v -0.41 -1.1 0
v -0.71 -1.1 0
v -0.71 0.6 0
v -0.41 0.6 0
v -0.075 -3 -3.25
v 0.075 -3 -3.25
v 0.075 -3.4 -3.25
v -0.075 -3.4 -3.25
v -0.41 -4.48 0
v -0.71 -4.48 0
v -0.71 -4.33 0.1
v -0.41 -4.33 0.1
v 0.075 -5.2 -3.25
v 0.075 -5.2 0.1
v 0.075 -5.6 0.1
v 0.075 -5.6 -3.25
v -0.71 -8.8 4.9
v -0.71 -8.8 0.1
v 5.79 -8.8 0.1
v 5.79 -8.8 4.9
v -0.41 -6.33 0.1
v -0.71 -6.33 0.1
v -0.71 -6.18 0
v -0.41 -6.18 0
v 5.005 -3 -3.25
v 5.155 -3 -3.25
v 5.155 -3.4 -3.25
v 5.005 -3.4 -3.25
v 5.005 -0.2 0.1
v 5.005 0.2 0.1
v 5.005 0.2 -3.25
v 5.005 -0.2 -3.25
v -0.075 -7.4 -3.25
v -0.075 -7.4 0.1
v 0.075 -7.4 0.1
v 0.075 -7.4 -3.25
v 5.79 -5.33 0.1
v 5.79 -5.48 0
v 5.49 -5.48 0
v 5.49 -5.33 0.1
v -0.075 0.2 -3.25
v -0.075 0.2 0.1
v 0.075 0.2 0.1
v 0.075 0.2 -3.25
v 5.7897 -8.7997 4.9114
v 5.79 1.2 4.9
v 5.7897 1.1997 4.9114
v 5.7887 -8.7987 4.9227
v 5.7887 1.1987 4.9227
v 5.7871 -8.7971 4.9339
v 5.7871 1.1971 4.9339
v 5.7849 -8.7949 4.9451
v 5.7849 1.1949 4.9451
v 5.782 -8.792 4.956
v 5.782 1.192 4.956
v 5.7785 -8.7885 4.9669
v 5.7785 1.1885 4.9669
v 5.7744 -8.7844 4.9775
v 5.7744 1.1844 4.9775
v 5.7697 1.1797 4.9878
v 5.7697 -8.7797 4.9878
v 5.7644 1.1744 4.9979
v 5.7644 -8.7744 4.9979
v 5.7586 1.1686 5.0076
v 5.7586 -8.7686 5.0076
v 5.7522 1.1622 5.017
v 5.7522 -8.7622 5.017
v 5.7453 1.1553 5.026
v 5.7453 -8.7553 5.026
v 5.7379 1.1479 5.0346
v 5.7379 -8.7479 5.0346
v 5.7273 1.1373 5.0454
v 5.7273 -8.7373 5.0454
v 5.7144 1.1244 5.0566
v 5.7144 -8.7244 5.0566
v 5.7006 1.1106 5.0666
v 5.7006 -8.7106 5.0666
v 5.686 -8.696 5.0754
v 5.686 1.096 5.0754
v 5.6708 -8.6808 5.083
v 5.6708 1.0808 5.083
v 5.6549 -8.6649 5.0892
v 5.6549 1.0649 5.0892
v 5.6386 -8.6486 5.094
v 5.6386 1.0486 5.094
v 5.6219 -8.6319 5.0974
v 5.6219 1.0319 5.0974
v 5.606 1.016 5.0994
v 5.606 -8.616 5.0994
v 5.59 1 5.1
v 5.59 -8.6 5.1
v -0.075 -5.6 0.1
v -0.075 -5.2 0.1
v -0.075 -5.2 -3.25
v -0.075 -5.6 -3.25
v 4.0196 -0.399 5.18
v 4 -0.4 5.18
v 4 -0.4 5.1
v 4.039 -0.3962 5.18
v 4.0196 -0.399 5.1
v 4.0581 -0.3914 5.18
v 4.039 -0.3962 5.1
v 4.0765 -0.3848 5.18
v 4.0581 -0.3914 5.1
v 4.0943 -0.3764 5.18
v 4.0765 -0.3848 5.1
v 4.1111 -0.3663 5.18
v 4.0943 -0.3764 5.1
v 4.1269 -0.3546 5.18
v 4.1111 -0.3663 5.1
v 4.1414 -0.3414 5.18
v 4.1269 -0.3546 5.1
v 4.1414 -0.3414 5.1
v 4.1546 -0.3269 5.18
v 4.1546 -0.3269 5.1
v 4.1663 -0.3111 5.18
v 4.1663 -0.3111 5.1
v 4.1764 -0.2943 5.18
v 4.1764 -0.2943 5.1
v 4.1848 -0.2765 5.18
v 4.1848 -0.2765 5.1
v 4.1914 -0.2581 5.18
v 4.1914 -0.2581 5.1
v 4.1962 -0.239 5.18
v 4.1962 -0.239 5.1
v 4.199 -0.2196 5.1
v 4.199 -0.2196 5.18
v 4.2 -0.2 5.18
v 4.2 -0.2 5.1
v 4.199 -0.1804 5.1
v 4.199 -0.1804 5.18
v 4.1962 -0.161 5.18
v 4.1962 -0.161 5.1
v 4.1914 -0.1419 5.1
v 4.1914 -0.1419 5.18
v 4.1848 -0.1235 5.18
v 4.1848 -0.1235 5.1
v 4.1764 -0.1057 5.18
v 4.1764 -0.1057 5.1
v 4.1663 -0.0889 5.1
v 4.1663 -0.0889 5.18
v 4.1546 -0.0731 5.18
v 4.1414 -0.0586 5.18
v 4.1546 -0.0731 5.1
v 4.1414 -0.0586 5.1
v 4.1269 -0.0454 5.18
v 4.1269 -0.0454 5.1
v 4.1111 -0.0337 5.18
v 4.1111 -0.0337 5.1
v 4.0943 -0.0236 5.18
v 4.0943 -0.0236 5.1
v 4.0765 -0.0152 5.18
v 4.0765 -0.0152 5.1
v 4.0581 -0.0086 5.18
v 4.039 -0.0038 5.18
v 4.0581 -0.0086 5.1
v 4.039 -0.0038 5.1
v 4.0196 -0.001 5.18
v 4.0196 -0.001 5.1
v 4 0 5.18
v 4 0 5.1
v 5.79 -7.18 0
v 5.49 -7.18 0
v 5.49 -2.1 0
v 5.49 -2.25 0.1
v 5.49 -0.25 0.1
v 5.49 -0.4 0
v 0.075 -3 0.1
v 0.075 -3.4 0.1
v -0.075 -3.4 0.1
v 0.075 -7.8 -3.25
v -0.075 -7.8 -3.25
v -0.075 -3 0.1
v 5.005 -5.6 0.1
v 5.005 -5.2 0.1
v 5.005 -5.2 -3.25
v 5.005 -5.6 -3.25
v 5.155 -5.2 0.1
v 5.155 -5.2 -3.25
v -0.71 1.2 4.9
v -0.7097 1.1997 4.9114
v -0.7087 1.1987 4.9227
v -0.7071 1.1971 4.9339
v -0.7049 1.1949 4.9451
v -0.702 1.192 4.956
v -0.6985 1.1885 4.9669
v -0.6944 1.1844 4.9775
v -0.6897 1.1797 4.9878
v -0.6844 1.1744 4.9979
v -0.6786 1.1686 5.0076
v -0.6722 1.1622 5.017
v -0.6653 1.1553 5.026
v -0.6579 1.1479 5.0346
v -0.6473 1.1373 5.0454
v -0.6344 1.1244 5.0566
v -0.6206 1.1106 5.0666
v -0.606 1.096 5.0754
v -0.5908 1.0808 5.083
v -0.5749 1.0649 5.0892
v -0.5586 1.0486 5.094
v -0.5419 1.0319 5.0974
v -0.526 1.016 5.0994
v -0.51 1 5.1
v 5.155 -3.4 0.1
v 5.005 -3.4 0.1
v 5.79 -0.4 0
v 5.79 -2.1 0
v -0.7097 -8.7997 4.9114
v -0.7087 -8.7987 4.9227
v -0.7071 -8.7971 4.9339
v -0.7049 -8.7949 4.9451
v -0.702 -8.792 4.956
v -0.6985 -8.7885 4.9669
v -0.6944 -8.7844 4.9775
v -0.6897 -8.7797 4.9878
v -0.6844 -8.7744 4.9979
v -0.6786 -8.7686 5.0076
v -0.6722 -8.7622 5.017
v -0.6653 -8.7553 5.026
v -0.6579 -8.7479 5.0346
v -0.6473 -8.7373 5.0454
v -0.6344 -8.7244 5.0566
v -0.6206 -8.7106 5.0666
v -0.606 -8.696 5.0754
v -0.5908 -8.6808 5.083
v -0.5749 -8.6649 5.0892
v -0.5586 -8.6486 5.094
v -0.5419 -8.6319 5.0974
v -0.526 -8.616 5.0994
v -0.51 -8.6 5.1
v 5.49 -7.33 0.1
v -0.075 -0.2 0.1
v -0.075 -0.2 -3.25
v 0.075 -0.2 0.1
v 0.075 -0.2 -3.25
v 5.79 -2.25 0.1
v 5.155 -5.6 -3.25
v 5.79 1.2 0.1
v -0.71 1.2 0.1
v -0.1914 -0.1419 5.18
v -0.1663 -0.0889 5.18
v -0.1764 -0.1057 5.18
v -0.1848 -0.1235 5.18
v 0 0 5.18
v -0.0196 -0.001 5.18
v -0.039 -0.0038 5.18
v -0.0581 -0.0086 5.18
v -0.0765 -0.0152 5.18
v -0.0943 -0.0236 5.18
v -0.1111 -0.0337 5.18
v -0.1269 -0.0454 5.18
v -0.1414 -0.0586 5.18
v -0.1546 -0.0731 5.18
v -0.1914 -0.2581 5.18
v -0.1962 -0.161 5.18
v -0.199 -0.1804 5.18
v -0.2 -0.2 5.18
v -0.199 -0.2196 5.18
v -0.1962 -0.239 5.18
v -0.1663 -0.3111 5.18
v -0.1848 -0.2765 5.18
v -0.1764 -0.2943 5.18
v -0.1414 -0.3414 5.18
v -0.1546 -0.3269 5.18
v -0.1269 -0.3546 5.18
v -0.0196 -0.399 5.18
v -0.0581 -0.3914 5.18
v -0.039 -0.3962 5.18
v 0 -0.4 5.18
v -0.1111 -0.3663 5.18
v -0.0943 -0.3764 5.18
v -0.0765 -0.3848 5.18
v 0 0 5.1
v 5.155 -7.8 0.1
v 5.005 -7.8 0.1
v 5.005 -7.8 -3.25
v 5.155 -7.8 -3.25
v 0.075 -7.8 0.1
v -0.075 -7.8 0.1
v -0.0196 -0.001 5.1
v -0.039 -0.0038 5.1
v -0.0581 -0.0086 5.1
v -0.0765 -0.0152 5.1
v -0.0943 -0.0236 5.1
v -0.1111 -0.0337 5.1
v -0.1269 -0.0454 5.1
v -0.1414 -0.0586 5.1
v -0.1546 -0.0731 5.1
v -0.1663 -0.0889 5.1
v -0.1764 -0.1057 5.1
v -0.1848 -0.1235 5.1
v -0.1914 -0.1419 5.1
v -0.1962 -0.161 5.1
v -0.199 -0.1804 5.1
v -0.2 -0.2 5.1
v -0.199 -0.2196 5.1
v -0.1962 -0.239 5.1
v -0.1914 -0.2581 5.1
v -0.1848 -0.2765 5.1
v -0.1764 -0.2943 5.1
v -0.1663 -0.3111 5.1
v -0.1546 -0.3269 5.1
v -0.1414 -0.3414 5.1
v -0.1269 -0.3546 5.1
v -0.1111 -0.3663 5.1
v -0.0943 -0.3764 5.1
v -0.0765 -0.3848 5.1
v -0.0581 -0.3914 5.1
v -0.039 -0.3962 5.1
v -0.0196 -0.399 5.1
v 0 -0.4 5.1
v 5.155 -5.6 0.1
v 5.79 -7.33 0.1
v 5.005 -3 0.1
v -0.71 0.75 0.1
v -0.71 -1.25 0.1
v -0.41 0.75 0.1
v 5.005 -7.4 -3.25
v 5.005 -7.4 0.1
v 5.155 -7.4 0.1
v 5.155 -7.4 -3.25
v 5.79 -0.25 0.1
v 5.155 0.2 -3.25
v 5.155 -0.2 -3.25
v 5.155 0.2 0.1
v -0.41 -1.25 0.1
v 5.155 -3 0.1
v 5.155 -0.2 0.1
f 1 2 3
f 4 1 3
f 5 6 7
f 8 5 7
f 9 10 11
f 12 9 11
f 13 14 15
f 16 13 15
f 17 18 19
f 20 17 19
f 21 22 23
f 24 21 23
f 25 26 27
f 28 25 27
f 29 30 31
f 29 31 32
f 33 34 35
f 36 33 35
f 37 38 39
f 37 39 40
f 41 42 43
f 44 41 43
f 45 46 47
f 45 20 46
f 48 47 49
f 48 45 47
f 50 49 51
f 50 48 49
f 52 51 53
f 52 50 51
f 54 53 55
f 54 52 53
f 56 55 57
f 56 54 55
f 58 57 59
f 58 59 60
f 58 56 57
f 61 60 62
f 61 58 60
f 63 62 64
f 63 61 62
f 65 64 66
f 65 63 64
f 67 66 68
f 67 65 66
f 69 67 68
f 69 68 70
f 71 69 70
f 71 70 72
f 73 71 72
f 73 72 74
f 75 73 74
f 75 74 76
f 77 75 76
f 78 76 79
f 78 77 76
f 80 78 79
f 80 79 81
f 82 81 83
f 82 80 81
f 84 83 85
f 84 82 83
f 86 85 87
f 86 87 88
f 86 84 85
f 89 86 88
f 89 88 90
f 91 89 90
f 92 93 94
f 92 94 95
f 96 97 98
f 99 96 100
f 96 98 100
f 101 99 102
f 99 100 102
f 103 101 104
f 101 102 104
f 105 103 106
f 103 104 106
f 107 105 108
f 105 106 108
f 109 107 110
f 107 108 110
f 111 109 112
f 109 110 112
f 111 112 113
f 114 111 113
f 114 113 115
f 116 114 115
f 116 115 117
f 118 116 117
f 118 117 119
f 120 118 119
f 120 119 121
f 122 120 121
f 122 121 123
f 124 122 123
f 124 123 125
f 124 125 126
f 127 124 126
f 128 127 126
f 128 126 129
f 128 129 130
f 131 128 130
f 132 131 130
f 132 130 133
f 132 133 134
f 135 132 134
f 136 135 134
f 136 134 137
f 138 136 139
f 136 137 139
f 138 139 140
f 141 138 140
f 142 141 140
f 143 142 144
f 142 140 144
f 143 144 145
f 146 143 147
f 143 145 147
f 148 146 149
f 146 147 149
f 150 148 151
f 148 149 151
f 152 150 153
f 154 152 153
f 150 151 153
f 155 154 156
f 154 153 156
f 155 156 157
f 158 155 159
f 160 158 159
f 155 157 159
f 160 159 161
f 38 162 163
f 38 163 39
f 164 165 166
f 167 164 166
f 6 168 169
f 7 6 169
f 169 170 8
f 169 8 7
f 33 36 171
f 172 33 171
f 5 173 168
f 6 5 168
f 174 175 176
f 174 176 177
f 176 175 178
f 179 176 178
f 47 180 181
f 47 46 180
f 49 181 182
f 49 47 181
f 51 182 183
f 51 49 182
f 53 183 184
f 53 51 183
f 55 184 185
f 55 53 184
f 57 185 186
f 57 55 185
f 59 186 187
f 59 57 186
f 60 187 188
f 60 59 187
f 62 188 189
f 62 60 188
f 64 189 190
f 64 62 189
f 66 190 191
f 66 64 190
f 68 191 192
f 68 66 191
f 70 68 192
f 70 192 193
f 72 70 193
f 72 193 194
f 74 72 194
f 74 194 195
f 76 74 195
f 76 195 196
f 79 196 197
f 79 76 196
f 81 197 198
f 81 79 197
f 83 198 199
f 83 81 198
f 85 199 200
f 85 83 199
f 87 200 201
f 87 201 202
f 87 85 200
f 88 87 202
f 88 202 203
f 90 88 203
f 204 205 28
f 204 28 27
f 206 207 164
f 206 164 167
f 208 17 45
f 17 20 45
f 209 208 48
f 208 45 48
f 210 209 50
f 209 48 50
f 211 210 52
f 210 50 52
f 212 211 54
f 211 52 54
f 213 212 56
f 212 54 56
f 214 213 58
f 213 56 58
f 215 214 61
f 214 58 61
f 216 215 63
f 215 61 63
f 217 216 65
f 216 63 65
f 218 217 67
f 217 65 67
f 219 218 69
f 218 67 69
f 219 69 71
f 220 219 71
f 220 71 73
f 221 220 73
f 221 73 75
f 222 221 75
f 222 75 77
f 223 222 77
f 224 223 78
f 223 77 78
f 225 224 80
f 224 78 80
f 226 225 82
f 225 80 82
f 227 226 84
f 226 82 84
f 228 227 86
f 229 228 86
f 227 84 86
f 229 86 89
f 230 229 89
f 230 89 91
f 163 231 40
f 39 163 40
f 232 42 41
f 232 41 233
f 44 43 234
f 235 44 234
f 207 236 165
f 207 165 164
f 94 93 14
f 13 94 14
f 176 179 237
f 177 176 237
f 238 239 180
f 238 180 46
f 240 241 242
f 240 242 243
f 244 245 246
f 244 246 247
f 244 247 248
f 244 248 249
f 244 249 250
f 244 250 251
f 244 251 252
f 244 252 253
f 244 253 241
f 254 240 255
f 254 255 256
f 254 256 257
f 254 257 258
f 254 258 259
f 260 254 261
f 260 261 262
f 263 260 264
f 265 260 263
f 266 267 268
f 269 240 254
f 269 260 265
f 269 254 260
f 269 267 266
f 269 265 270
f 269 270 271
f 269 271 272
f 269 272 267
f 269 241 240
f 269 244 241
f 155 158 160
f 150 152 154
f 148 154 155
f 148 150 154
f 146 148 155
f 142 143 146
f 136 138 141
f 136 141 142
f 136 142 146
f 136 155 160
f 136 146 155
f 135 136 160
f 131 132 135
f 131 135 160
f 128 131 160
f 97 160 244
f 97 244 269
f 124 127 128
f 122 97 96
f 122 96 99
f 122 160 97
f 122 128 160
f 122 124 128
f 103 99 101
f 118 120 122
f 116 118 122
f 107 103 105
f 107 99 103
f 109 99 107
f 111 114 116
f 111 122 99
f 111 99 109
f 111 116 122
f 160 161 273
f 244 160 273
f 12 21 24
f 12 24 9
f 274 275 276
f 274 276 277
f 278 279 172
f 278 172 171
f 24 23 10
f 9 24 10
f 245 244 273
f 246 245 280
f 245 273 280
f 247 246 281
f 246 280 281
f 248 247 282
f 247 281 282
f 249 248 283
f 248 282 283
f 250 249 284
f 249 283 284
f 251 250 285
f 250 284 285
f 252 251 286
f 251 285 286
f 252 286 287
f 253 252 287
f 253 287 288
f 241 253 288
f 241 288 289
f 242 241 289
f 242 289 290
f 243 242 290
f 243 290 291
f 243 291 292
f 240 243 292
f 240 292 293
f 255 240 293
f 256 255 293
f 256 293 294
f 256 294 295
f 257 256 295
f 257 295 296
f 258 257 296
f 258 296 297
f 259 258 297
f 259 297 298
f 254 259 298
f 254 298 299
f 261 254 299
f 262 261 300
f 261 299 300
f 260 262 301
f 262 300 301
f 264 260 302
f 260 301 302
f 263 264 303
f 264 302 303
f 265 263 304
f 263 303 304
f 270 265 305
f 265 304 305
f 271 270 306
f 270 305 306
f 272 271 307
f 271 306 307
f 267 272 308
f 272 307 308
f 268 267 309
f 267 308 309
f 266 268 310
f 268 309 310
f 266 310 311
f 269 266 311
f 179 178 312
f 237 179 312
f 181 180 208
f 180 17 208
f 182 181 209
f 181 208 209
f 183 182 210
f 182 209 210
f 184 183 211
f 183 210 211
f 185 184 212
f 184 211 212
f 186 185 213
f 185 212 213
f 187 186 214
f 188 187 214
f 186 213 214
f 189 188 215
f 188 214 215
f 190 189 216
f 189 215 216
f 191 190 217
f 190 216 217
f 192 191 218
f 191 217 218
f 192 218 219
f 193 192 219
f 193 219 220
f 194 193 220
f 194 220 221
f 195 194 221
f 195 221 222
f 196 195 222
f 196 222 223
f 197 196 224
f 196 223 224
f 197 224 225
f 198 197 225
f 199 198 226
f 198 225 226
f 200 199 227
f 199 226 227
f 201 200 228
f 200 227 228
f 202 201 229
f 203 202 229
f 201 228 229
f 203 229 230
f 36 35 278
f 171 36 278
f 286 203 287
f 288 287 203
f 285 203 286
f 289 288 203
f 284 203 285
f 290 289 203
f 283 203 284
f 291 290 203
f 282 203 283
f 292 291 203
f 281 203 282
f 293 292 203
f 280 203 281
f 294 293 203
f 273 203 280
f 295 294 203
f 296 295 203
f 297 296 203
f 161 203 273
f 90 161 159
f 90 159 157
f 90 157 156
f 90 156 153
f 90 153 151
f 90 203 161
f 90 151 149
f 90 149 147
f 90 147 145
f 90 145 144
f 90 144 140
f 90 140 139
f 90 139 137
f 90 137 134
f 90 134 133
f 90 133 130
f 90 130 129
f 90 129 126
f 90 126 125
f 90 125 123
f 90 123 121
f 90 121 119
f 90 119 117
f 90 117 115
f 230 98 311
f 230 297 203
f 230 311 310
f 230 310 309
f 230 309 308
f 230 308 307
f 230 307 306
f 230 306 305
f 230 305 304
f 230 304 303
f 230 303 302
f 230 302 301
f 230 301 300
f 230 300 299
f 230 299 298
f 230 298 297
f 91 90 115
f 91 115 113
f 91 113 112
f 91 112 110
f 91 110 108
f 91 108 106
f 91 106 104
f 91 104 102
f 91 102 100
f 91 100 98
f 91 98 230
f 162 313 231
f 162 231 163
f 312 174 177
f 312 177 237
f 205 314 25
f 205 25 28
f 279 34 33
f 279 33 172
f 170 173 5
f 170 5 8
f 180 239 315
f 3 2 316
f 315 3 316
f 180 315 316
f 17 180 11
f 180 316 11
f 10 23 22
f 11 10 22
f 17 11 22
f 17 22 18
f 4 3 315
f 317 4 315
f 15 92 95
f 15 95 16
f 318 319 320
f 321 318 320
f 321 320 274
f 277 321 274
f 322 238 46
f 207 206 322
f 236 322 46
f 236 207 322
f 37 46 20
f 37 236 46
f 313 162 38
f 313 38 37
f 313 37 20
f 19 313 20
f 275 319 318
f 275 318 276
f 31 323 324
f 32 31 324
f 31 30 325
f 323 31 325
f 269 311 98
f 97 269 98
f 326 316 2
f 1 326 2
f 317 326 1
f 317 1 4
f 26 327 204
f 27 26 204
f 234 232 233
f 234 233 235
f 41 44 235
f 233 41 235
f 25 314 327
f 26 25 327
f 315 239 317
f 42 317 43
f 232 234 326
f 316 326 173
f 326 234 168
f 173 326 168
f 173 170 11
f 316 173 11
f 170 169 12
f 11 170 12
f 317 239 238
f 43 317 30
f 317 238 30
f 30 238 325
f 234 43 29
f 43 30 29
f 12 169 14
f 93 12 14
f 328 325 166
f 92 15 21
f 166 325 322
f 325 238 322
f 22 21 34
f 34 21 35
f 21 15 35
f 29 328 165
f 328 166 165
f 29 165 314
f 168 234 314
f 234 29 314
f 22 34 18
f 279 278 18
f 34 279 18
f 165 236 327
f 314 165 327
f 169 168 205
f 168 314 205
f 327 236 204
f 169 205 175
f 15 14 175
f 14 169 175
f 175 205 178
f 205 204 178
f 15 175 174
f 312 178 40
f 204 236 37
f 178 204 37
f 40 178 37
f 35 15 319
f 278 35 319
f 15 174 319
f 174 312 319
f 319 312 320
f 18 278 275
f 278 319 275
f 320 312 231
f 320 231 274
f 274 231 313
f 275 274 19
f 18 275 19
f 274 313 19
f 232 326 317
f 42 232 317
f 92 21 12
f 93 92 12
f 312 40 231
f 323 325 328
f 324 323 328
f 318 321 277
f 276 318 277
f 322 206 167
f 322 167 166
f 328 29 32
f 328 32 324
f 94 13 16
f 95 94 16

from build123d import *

# Parameters (mm, degrees)
PAD003_DEPTH = 0.3
PAD001_DEPTH = 0.18
SKETCH002_W  = 0.4
SKETCH002_H  = 0.15
PAD002_DEPTH = 3.5
SKETCH_W     = 10
SKETCH_H     = 6.5
PAD_DEPTH    = 5
POCKET_DEPTH = 0.5
FILLET_R     = 0.2
PAD004_DEPTH = 0.3


with BuildPart() as pad003:
    # Sketch005 → Pad003 (new body)
    with BuildSketch(Plane(origin=(-0.71, 1, 0), x_dir=(0, 1, 0), z_dir=(1, 0, 0))):
        Polygon((-7.33, 0.1), (-7.18, 0), (-5.48, 0), (-5.33, 0.1), align=None)
        Polygon((-2.25, 0.1), (-2.1, 0), (-0.4, 0), (-0.25, 0.1), align=None)
    extrude(amount=PAD003_DEPTH)


with BuildPart() as pad001:
    # Sketch001 → Pad001 (new body)
    with BuildSketch(Plane(origin=(0, 0, 5), x_dir=(0, -1, 0), z_dir=(0, 0, 1))):
        with BuildLine():
            Line((0.4, 0), (0.4, 4))
            ThreePointArc((0.4, 4), (0.2, 4.2), (0, 4))
            Line((0, 4), (0, 0))
            ThreePointArc((0, 0), (0.2, -0.2), (0.4, 0))
        make_face()
    extrude(amount=PAD001_DEPTH)


with BuildPart() as pad002:
    # Sketch002 → Pad002 (new body)
    with BuildSketch(Plane(origin=(0, 0, 0.25), x_dir=(0, -1, 0), z_dir=(0, 0, 1))):
        Rectangle(SKETCH002_W, SKETCH002_H)
        with Locations((3.2, 0)):
            Rectangle(SKETCH002_W, SKETCH002_H)
        with Locations((5.4, 0)):
            Rectangle(SKETCH002_W, SKETCH002_H)
        with Locations((7.6, 0)):
            Rectangle(SKETCH002_W, SKETCH002_H)
        with Locations((0, 5.08)):
            Rectangle(SKETCH002_W, SKETCH002_H)
        with Locations((3.2, 5.08)):
            Rectangle(SKETCH002_W, SKETCH002_H)
        with Locations((5.4, 5.08)):
            Rectangle(SKETCH002_W, SKETCH002_H)
        with Locations((7.6, 5.08)):
            Rectangle(SKETCH002_W, SKETCH002_H)
    extrude(amount=-PAD002_DEPTH)


with BuildPart() as fillet_body:
    # Sketch → Pad (new body)
    with BuildSketch(Plane(origin=(0, 0, 0.1), x_dir=(0, -1, 0), z_dir=(0, 0, 1))):
        with Locations((3.8, 2.54)):
            Rectangle(SKETCH_W, SKETCH_H)
    extrude(amount=PAD_DEPTH)

    # Sketch003 → Pocket (cut)
    with BuildSketch(Plane(origin=(0, 0, 5.1), x_dir=(0, -1, 0), z_dir=(0, 0, 1))):
        with BuildLine():
            ThreePointArc((-0.318267, 7.6), (0.223846, 7.813173), (0.45, 8.35))
            Line((0.45, 8.35), (-2.05, 8.35))
            Line((-2.05, 8.35), (-2.05, 7.6))
            Line((-2.05, 7.6), (-0.318267, 7.6))
        make_face()
        with BuildLine():
            Line((9.6, -0.75), (12.1, -0.75))
            Line((12.1, -0.75), (12.1, 0))
            Line((10.285847, 0), (12.1, 0))
            ThreePointArc((10.285847, 0), (9.797313, -0.241845), (9.6, -0.75))
        make_face()
    extrude(amount=-POCKET_DEPTH, mode=Mode.SUBTRACT)

    # Fillet
    fillet_edges = [fillet_body.edges().sort_by_distance(p)[0] for p in [
        (-0.71, -3.8, 5.1),
        (2.54, -8.8, 5.1),
        (5.79, -3.8, 5.1),
        (2.54, 1.2, 5.1),
    ]]
    fillet(fillet_edges, radius=FILLET_R)


with BuildPart() as relay_dpdt_omron_g6k_2p_y:
    # Sketch006 → Pad004 (new body)
    with BuildSketch(Plane.YZ.offset(5.79)):
        Polygon((-7.33, 0.1), (-7.18, 0), (-5.48, 0), (-5.33, 0.1), align=None)
        Polygon((-2.25, 0.1), (-2.1, 0), (-0.4, 0), (-0.25, 0.1), align=None)
    extrude(amount=-PAD004_DEPTH)

    # Pad004_mp_cp: union Pad003, Pad001, Pad002, Fillet body
    add(pad003.part)
    add(pad001.part)
    add(pad002.part)
    add(fillet_body.part)


solid = relay_dpdt_omron_g6k_2p_y.part
